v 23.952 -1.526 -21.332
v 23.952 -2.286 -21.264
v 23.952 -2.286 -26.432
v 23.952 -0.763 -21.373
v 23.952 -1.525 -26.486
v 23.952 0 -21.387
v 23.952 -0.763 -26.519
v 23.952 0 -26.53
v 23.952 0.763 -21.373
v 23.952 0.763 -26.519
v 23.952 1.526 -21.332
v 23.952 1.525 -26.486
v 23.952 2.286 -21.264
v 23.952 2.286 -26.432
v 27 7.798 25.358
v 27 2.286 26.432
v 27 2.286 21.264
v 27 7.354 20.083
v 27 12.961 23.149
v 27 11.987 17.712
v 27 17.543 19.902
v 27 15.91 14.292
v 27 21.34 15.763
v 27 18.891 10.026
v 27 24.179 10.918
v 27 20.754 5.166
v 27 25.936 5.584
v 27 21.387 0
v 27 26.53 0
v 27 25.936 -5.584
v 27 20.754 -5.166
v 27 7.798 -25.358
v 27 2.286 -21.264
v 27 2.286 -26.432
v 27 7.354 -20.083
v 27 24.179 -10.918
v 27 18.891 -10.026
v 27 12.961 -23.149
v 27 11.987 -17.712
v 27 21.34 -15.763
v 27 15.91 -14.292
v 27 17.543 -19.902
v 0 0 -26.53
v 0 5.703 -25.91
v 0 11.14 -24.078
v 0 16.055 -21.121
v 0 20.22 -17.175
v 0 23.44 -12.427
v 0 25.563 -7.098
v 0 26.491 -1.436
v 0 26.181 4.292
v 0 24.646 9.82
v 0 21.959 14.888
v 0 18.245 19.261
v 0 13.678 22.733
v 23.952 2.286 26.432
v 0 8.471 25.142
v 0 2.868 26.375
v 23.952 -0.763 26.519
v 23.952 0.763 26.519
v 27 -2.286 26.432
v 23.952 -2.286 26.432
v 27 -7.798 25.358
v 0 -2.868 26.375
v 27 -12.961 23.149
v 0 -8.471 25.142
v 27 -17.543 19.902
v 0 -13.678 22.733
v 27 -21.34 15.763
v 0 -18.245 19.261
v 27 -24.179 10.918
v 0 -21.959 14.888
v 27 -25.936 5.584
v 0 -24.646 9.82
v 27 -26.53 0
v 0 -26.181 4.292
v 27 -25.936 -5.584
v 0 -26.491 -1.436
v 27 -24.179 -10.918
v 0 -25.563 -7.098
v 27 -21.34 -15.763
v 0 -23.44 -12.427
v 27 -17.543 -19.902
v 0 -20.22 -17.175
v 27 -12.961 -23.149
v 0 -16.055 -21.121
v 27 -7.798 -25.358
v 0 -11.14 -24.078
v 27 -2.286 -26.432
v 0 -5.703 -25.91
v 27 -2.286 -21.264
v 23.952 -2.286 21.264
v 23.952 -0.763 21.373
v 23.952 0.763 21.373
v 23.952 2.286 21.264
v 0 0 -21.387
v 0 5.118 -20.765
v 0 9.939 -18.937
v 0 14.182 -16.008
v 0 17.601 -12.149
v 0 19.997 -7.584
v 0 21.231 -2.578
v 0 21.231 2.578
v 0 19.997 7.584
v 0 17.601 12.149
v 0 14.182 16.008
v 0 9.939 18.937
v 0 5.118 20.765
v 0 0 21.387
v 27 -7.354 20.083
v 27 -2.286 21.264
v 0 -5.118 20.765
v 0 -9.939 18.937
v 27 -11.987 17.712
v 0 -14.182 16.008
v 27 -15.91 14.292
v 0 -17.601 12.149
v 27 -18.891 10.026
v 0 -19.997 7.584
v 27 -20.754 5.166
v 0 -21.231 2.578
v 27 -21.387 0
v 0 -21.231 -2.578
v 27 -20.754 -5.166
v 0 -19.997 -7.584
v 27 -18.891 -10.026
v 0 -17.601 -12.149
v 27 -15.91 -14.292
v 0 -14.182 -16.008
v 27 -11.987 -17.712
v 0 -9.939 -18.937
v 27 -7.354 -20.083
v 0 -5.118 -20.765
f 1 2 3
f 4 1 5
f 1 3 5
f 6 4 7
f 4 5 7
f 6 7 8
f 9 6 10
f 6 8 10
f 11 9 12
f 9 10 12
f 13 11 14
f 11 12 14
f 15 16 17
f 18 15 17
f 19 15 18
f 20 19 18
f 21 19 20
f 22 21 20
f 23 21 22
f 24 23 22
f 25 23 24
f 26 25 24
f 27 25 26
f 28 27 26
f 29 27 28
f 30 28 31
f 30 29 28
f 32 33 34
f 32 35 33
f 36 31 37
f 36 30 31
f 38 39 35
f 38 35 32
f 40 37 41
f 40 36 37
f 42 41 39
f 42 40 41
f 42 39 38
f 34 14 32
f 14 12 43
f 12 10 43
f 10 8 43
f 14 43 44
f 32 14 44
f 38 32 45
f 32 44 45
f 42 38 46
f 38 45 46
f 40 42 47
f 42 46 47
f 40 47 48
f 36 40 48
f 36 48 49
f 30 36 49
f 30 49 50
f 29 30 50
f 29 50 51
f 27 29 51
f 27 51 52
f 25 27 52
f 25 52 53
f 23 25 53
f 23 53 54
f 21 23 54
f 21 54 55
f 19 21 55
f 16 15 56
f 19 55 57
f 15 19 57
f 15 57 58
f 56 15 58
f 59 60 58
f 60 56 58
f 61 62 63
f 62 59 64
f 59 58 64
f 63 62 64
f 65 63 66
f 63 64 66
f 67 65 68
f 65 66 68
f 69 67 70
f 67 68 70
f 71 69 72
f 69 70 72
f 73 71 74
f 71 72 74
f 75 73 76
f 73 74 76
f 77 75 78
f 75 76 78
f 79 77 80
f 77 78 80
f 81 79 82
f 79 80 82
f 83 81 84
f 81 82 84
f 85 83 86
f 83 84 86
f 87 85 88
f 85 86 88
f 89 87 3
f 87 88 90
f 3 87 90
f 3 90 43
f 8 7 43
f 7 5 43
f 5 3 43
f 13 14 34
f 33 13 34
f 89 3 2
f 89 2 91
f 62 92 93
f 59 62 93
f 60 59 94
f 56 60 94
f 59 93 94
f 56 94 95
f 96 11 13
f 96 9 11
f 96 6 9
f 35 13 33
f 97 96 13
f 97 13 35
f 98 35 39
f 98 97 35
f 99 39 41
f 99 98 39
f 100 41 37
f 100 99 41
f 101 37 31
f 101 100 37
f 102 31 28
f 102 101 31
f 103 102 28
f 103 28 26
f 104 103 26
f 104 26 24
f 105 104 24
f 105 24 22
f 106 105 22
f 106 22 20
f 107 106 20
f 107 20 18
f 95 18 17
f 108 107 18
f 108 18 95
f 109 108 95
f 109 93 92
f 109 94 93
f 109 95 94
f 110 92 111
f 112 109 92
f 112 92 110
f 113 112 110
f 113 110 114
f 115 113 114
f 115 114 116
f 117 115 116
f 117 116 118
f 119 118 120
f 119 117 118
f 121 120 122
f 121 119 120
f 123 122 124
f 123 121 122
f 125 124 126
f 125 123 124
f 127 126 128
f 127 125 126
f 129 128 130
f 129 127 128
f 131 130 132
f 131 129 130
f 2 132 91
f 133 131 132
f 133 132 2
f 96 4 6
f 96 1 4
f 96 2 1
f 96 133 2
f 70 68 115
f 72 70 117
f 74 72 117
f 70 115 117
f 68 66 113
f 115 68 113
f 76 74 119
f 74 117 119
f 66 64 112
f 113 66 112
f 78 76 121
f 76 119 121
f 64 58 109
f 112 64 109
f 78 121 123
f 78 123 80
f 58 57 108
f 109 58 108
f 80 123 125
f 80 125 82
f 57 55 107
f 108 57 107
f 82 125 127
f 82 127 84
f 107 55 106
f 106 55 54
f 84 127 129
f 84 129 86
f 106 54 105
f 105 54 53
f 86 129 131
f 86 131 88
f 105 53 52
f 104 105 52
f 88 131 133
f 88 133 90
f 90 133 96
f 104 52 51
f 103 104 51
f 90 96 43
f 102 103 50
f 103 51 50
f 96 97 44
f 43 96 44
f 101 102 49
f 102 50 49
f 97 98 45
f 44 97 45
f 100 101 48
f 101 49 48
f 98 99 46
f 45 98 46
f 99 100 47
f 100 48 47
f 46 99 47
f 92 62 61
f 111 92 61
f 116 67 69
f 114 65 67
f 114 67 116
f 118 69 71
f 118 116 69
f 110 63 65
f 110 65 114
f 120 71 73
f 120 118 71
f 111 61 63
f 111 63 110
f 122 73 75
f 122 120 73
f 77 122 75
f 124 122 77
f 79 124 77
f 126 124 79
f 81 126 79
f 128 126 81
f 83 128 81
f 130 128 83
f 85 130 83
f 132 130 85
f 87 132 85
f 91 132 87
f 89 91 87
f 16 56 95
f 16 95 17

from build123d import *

# Parameters (mm, degrees)
SKETCH2_R               = 26.5303
SKETCH2_R_2             = 21.3868
BOSS_EXTRUDE1_DEPTH     = 27.0002
CUT_EXTRUDE1_DEPTH      = 47.224716724
CUT_EXTRUDE1_DEPTH_BACK = 47.224716724
SKETCH3_W               = 3.048
SKETCH3_H               = 4.572


with BuildPart() as part:
    # Sketch2 → Boss-Extrude1 (new body)
    with BuildSketch(Plane(origin=(0, 0, 0), x_dir=(0, 0, -1), z_dir=(1, 0, 0))):
        Circle(SKETCH2_R)
        Circle(SKETCH2_R_2, mode=Mode.SUBTRACT)
    extrude(amount=BOSS_EXTRUDE1_DEPTH)

    # Sketch3 → Cut-Extrude1 (cut, two sides: drawn at the far end of the back side and taken through both)
    with BuildSketch(Plane.XY.offset(-CUT_EXTRUDE1_DEPTH_BACK)):
        with Locations((25.4762, 0)):
            Rectangle(SKETCH3_W, SKETCH3_H)
    extrude(amount=CUT_EXTRUDE1_DEPTH + CUT_EXTRUDE1_DEPTH_BACK, mode=Mode.SUBTRACT)


solid = part.part
